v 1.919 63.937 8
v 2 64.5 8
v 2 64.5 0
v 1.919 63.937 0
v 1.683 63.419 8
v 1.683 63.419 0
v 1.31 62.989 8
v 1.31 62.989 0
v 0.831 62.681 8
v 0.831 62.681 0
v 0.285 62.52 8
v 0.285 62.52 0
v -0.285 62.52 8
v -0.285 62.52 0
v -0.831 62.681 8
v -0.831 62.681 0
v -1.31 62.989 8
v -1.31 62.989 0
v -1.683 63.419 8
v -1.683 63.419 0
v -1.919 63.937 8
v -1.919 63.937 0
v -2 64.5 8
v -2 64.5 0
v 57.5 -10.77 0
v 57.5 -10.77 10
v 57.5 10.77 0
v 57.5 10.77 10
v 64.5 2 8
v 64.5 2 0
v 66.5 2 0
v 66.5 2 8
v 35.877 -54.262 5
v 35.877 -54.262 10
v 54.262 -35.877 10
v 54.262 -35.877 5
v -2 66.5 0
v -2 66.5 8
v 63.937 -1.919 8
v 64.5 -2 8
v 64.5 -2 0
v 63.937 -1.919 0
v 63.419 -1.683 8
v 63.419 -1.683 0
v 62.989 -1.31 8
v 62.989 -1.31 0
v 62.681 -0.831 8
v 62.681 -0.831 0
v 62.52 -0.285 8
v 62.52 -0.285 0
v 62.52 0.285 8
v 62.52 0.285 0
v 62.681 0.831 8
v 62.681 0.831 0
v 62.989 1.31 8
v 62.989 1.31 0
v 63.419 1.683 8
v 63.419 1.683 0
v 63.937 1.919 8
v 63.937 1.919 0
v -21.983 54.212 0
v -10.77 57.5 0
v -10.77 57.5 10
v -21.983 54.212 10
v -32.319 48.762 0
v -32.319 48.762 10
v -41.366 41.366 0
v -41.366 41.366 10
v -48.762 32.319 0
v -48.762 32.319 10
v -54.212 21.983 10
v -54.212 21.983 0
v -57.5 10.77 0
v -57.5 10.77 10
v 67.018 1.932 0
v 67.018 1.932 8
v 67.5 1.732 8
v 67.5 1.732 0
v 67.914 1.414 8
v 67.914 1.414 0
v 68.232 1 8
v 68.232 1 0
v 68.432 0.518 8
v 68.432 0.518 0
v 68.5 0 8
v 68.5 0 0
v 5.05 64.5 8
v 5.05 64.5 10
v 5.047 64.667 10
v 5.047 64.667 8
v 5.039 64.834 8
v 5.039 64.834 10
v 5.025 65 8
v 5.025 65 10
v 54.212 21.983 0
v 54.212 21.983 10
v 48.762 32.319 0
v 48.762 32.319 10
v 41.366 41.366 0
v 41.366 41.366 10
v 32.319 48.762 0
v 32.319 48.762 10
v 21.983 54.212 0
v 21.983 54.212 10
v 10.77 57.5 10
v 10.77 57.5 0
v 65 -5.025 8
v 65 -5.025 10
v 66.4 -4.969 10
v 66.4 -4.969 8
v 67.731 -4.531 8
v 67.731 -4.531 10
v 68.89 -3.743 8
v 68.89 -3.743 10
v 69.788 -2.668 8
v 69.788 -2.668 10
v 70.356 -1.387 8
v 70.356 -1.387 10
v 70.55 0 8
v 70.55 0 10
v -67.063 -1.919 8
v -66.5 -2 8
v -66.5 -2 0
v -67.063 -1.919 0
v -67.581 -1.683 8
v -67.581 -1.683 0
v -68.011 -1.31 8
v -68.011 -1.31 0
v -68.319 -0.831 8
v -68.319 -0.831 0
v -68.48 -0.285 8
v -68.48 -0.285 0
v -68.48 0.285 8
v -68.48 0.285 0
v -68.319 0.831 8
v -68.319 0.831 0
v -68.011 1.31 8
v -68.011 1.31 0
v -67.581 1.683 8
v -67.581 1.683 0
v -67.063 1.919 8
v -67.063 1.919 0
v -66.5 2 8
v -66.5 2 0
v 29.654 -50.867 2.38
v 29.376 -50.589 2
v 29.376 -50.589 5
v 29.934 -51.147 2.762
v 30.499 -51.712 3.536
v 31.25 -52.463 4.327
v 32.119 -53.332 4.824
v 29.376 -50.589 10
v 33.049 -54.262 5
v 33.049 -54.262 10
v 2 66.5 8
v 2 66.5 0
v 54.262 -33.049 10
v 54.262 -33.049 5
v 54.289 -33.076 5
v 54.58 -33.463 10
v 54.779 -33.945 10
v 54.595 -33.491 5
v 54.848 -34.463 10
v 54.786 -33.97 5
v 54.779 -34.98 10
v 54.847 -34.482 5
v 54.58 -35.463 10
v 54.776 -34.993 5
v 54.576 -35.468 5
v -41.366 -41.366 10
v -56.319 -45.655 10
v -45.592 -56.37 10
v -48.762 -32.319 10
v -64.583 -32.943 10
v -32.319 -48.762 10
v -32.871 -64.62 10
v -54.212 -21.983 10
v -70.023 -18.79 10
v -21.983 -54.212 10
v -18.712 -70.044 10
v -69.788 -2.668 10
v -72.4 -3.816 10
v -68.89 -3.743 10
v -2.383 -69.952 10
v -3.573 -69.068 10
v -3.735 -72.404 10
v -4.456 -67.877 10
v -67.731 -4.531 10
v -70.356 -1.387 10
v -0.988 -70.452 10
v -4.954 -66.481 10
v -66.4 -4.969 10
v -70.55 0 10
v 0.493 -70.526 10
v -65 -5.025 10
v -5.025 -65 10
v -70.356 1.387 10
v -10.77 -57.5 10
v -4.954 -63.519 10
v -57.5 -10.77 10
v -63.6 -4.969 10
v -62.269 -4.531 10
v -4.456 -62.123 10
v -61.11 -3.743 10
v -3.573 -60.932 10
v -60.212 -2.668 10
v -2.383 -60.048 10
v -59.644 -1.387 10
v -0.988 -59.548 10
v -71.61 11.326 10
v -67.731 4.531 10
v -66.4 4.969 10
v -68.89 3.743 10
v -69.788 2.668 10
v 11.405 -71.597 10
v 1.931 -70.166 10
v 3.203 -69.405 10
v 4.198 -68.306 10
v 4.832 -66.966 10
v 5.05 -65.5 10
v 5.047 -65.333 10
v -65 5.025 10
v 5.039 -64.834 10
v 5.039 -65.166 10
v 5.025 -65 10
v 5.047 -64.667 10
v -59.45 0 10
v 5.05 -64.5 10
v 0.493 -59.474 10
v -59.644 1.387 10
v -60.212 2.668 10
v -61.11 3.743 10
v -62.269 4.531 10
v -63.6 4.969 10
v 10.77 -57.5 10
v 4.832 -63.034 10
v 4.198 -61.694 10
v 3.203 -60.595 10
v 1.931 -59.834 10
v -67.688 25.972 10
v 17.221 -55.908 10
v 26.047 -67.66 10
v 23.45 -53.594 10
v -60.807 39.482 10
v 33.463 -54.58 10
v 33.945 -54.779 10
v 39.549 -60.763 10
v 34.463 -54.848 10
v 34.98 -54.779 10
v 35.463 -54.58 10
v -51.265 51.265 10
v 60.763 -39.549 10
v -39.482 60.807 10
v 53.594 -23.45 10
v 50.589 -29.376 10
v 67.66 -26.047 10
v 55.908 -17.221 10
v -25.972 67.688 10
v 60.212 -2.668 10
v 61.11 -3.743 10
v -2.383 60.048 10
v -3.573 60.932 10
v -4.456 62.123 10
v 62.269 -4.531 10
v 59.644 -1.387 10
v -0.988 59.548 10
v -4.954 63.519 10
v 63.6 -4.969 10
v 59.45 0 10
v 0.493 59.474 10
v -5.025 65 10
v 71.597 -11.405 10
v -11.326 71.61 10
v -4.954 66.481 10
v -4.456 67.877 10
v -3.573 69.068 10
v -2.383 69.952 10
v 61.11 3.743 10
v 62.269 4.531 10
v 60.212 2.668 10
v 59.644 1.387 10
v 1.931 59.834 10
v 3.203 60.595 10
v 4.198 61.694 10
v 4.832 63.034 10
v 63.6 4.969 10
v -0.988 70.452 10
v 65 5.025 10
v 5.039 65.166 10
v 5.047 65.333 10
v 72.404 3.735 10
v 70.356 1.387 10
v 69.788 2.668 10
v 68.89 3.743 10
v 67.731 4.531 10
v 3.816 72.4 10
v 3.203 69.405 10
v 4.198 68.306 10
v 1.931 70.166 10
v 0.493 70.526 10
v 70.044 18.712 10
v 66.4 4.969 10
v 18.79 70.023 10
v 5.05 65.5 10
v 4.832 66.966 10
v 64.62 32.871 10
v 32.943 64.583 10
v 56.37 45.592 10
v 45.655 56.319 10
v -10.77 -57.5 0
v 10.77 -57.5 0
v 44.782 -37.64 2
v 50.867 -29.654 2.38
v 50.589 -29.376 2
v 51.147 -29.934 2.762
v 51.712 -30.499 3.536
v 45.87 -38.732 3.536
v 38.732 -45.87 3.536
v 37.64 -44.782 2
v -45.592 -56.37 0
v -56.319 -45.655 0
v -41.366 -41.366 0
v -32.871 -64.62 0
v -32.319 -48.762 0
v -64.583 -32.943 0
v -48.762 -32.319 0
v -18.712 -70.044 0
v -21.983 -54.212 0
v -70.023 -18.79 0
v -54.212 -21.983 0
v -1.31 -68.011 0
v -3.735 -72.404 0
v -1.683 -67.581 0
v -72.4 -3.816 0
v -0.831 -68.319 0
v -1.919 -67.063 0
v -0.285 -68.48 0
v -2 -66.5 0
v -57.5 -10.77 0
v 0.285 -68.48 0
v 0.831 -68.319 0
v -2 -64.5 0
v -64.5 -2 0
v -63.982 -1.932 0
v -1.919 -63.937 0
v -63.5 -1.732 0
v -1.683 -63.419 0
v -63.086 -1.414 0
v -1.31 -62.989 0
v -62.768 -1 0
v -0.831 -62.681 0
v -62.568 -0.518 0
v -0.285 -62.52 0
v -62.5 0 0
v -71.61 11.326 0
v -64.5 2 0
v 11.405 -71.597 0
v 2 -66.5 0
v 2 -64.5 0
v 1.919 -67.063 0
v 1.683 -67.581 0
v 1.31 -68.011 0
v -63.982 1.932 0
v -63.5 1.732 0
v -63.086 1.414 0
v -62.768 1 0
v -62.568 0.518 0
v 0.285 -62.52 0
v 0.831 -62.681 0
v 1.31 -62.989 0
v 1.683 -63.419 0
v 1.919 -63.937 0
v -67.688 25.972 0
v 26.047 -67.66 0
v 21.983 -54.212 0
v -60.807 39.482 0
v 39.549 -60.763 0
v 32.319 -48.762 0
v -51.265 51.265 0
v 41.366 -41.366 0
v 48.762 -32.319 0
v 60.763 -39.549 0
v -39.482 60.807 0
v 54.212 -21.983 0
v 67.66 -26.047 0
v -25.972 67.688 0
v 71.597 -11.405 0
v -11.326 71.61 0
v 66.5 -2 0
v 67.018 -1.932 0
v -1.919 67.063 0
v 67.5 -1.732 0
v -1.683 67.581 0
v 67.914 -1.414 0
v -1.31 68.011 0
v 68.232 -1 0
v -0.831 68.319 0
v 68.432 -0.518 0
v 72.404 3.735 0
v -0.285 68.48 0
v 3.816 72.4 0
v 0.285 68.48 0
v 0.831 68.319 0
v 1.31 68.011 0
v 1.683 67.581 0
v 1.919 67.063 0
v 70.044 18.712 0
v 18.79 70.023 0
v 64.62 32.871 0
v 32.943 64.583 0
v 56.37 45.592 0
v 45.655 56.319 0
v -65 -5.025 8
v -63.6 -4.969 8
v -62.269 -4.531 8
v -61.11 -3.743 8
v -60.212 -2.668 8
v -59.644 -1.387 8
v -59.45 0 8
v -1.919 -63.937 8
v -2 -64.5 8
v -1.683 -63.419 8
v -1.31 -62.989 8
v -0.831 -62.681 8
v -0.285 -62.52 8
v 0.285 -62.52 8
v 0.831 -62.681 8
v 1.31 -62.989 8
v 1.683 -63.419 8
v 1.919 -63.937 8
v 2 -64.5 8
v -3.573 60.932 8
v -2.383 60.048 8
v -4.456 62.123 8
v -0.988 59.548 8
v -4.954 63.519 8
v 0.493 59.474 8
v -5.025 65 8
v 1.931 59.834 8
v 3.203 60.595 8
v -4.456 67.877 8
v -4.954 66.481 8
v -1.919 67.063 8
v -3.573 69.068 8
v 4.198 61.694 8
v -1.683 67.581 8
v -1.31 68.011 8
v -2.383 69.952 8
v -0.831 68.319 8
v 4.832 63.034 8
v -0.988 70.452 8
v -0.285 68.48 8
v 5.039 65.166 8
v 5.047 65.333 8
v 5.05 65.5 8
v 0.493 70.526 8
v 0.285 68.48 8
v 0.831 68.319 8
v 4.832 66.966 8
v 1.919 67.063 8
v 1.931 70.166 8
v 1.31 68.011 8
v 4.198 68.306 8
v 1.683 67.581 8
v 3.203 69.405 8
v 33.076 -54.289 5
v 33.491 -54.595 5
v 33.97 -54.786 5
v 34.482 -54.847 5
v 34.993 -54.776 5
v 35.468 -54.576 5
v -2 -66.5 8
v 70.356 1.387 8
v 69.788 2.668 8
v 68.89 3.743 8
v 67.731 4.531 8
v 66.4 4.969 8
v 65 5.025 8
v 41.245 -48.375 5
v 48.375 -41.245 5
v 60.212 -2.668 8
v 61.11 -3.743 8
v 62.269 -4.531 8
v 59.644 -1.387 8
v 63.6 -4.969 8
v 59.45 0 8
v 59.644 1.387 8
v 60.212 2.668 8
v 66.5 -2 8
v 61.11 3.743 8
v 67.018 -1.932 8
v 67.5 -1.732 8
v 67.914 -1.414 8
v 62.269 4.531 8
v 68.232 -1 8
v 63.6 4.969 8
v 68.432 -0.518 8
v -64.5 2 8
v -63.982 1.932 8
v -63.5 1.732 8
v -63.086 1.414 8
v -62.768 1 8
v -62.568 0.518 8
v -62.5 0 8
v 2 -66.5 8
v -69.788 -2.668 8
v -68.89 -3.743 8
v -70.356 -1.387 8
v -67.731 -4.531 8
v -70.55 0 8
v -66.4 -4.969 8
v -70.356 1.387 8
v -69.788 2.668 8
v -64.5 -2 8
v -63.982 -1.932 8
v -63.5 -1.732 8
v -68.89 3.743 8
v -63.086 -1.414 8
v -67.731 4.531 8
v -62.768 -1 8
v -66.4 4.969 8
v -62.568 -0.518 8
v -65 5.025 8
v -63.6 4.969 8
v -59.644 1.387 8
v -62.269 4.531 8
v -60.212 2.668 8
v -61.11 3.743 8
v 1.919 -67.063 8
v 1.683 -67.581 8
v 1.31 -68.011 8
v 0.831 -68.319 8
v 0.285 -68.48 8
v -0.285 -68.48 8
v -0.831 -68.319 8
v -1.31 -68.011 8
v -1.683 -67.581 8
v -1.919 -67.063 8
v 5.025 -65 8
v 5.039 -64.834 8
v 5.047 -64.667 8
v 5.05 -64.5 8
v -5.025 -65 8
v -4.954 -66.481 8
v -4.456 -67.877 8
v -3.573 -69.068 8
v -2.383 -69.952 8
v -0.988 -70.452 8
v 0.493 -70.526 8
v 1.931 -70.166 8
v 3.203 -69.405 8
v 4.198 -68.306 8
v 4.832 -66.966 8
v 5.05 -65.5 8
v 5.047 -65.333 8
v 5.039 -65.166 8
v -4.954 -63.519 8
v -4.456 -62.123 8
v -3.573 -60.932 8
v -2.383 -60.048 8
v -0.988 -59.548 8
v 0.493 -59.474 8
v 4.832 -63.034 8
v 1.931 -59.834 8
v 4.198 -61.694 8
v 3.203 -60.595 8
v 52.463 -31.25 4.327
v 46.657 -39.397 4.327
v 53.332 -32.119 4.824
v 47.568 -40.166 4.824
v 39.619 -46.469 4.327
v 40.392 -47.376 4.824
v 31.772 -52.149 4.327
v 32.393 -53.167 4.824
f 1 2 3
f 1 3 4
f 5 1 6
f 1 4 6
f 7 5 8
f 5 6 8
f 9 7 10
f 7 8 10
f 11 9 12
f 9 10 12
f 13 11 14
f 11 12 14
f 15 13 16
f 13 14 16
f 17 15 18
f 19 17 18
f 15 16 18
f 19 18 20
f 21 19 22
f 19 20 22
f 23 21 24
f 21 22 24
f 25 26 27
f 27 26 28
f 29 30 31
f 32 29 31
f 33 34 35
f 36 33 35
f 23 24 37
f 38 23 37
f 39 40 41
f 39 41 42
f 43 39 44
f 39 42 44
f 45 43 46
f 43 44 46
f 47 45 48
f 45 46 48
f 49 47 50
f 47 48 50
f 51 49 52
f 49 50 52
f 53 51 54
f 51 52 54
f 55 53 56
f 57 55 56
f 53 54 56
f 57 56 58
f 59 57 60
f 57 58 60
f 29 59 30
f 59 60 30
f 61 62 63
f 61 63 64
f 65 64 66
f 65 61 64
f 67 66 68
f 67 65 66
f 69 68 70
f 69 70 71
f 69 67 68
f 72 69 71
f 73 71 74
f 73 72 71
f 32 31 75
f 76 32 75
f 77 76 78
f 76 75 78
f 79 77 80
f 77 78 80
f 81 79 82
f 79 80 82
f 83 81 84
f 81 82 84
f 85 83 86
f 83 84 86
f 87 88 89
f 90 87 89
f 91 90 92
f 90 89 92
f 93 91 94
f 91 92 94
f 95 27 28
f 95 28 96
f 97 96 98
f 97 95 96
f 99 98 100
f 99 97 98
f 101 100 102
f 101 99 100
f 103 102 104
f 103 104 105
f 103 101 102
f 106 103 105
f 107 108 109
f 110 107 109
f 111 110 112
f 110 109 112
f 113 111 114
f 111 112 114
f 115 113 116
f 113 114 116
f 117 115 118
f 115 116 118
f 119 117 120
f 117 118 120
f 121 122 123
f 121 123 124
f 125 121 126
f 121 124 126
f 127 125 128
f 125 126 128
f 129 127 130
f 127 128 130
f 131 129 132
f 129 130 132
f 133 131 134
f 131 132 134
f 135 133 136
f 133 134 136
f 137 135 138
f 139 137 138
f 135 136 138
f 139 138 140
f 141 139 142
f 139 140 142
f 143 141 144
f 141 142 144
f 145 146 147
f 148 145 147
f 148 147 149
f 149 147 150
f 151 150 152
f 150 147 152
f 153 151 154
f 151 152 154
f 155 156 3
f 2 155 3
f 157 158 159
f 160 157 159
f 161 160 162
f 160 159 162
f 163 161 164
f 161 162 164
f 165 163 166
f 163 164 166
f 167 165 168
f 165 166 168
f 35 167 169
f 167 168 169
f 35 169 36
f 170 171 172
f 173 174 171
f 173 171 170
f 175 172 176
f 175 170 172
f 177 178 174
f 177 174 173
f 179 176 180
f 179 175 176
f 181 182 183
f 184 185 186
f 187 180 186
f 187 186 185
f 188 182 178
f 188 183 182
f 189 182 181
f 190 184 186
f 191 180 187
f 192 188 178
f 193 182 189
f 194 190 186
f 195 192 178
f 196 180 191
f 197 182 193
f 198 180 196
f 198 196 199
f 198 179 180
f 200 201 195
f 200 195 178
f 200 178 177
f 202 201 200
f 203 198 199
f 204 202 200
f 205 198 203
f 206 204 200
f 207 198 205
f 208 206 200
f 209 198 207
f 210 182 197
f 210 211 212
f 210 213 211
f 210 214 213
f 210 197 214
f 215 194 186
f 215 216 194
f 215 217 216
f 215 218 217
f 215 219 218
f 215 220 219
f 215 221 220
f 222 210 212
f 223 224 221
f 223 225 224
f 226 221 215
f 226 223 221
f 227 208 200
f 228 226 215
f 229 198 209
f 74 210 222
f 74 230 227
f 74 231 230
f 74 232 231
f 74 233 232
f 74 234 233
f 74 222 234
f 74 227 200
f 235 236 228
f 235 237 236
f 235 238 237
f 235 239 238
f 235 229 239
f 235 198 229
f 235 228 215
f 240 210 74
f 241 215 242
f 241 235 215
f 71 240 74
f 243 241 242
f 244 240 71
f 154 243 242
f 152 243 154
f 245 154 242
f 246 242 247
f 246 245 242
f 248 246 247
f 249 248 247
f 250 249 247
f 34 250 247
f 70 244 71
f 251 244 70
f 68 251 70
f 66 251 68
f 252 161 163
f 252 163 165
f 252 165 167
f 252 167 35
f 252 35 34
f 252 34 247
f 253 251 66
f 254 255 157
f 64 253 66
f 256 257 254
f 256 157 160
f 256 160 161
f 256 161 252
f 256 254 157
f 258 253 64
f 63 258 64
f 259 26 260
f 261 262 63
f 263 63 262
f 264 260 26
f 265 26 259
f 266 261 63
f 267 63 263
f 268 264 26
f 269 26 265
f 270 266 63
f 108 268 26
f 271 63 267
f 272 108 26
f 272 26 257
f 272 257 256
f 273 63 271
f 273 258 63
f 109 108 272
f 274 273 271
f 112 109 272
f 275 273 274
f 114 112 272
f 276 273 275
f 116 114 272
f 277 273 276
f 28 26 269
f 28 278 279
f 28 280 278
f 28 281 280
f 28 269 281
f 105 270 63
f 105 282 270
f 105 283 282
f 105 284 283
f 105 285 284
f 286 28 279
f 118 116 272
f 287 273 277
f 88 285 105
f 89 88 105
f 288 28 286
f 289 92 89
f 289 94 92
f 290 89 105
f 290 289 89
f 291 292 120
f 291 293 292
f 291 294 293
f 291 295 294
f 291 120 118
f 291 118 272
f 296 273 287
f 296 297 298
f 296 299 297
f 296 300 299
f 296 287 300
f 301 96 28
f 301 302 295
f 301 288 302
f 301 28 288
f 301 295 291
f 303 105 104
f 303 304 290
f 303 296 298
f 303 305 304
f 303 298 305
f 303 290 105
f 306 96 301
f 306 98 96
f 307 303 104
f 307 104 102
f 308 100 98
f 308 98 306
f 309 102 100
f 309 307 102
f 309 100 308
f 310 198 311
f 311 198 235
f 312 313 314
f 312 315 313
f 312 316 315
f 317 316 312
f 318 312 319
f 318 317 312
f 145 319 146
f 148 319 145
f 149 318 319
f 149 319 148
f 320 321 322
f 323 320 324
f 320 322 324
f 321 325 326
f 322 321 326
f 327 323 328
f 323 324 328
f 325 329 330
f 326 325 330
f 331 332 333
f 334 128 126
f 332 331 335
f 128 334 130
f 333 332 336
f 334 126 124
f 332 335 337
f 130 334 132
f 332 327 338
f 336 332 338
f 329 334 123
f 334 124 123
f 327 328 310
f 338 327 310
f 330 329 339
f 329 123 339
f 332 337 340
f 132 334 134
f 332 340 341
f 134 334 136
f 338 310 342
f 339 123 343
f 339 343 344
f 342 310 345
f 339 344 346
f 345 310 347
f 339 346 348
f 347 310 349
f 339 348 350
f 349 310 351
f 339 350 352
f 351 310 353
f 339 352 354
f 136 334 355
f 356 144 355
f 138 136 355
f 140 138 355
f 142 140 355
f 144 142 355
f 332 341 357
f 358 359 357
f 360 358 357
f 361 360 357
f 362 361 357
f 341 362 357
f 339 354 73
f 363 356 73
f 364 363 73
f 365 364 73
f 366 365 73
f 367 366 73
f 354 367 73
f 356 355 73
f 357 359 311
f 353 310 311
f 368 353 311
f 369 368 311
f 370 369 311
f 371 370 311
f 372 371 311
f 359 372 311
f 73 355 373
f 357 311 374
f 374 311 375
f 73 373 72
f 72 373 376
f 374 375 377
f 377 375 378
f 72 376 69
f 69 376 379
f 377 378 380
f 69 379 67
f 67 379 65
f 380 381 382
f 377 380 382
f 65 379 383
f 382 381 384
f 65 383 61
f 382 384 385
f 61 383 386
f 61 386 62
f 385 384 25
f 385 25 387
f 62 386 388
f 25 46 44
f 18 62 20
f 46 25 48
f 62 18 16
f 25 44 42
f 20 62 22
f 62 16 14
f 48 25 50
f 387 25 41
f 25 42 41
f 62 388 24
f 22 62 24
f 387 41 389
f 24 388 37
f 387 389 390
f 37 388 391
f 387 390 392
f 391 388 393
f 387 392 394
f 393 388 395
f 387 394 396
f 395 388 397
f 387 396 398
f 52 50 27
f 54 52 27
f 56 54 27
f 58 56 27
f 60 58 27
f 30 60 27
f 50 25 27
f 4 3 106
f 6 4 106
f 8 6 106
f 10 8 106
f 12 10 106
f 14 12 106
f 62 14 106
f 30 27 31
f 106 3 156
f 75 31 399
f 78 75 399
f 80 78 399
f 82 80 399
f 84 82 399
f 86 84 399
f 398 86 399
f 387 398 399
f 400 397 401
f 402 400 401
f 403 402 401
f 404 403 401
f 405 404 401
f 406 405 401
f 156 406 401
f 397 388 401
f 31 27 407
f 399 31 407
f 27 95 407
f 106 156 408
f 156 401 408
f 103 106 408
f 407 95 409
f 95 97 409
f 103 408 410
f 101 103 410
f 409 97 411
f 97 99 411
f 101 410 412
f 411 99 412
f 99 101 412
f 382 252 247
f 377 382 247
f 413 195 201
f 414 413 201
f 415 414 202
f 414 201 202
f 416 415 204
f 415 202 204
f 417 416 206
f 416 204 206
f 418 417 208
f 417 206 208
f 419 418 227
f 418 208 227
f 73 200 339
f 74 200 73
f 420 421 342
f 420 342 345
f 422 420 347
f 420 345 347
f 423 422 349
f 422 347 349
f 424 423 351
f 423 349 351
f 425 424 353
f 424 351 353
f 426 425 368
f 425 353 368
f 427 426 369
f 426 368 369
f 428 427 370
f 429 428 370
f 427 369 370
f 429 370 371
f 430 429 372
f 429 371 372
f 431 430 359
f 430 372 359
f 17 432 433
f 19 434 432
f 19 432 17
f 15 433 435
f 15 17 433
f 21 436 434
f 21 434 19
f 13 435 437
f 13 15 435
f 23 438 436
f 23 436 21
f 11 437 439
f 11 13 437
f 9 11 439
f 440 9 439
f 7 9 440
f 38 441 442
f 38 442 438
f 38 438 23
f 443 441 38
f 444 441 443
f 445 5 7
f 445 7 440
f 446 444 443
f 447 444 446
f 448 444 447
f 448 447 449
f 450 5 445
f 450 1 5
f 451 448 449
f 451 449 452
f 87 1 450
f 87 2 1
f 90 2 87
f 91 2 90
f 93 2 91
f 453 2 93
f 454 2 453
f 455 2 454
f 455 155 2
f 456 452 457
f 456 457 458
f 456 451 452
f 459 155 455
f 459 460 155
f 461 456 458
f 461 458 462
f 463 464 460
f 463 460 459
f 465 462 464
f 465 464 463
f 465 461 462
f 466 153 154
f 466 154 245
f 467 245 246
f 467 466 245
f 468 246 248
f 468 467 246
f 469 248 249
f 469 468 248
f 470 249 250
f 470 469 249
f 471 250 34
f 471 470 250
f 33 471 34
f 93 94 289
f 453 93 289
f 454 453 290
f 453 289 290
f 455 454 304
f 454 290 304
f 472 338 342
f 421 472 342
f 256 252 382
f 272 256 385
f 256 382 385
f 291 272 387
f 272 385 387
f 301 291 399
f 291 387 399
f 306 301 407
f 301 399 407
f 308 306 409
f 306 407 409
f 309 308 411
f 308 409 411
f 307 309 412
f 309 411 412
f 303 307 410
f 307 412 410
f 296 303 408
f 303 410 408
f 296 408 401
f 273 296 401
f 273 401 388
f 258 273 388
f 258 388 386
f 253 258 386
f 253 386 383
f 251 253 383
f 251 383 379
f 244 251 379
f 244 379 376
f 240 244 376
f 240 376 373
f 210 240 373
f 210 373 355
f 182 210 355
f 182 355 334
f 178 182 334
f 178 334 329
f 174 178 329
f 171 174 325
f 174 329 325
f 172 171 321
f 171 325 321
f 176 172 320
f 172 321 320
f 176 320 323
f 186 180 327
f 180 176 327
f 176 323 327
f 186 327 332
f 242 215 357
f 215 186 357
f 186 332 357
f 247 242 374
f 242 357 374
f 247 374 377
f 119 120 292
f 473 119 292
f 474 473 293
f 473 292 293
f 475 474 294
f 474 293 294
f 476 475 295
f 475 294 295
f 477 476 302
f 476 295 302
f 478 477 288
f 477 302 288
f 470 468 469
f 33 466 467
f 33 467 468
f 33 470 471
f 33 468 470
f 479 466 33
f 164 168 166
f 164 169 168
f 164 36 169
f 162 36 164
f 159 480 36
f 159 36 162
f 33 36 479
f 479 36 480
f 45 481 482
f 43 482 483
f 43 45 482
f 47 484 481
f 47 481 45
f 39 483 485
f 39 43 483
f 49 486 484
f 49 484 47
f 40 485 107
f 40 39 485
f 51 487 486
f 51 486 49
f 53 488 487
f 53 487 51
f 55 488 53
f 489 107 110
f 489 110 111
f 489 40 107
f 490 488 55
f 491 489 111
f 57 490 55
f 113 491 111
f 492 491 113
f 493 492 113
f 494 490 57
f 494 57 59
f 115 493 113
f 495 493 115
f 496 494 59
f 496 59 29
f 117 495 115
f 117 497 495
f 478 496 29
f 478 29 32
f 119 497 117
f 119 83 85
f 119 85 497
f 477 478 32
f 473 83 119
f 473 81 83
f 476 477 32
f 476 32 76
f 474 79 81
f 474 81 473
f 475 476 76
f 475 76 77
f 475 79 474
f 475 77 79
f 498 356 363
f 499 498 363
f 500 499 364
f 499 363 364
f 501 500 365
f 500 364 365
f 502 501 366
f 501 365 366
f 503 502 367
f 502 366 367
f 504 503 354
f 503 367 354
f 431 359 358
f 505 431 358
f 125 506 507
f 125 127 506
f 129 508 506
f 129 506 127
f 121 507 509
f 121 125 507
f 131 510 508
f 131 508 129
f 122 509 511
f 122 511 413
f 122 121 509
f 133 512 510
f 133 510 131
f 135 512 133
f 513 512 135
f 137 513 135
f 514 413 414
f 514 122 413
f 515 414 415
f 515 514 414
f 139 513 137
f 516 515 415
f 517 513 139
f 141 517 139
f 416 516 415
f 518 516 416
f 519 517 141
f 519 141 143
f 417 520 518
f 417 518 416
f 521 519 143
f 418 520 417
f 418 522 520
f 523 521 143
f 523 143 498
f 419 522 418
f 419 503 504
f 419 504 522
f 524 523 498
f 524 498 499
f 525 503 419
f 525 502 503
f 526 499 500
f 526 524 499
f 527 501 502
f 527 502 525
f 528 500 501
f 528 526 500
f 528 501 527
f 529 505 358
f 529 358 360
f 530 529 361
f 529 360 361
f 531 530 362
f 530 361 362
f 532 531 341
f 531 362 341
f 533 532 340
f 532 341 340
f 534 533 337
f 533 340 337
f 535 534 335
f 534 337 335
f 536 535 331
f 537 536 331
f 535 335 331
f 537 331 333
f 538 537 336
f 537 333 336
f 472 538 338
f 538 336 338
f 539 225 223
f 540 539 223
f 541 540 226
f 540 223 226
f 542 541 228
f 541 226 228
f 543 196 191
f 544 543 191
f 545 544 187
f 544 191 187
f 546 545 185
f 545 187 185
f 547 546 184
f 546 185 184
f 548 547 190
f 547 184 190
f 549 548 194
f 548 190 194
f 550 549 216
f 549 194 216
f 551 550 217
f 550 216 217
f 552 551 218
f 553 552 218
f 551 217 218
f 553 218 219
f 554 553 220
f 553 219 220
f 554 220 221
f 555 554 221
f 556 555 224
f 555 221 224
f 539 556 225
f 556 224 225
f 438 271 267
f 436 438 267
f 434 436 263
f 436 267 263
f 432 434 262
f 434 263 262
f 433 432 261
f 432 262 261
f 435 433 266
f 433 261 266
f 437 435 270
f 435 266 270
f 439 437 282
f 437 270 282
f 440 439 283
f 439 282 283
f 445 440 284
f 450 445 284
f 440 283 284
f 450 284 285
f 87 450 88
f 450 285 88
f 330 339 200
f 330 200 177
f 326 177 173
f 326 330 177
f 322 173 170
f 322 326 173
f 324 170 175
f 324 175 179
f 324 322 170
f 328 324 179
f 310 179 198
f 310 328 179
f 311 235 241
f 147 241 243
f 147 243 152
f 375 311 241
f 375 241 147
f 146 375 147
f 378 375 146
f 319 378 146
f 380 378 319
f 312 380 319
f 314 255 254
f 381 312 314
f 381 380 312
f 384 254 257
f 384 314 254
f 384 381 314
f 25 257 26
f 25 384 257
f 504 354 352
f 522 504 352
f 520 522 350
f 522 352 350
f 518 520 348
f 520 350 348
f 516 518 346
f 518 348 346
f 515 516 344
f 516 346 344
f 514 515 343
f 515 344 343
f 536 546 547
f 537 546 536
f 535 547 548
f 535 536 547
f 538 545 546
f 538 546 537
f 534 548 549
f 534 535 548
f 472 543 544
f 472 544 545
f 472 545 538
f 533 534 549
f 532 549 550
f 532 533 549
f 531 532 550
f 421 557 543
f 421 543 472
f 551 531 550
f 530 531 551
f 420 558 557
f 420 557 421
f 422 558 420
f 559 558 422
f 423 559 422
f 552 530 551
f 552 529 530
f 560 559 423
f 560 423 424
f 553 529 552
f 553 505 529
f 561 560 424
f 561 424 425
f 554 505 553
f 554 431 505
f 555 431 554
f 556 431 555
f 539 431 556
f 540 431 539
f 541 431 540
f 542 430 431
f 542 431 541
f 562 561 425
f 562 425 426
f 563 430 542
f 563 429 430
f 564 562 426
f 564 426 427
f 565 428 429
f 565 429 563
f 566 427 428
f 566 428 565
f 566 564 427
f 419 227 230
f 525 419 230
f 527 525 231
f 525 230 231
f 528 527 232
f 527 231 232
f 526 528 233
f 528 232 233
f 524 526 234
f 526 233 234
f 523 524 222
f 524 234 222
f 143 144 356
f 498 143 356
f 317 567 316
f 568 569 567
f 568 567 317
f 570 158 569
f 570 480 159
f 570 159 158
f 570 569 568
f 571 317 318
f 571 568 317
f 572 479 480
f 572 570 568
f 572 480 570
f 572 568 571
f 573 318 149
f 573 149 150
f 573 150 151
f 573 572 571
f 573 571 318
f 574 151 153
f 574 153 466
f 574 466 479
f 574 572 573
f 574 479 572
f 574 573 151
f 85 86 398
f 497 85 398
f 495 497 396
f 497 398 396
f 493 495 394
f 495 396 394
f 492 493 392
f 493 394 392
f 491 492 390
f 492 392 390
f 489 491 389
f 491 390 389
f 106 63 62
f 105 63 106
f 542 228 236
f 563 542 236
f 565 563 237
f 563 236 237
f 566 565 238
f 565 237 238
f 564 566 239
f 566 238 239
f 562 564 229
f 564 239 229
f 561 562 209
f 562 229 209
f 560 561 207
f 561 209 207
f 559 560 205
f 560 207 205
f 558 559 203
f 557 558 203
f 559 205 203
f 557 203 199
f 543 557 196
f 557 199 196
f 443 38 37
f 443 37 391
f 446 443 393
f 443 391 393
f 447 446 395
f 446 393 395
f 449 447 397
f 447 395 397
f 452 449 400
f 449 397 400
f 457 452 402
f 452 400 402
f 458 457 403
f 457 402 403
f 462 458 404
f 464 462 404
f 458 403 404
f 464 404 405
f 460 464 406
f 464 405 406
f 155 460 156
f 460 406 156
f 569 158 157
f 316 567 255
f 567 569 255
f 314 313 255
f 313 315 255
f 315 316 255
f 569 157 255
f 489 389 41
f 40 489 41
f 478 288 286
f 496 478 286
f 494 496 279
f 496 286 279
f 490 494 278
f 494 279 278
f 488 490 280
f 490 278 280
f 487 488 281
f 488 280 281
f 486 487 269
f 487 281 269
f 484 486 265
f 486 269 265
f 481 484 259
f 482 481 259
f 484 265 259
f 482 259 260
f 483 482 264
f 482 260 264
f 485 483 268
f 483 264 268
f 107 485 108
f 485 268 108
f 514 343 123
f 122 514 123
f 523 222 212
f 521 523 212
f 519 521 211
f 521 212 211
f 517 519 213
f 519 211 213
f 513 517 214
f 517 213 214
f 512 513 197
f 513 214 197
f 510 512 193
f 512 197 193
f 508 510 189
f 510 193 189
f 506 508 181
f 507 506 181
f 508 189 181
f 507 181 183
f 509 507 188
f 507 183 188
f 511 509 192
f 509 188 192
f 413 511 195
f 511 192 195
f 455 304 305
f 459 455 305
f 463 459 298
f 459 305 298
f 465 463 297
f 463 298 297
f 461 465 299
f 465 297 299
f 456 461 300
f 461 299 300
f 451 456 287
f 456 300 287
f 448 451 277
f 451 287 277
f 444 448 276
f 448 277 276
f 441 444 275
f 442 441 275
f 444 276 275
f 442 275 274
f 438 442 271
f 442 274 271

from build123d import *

# Parameters (mm, degrees)
F0_R      = 72.5
F0_R_2    = 58.5
F1_DEPTH  = 10
F3_DEPTH  = 10.001
F5_DEPTH  = 5
F7_DEPTH  = 2
F8_SIZE   = 3
F9_R      = 5
F10_R     = 2
F11_W     = 21.5406592285
F11_H     = 1
F11_W_2   = 1
F11_H_2   = 21.5406592285
F12_DEPTH = 10


with BuildPart() as f1:
    # F0 (on Top) → F1 (new body)
    with BuildSketch(Plane.XY):
        Circle(F0_R)
        with BuildLine():
            ThreePointArc((2, -66.5), (0, -68.5), (-2, -66.5))
            Line((-2, -66.5), (-2, -64.5))
            ThreePointArc((-2, -64.5), (0, -62.5), (2, -64.5))
            Line((2, -64.5), (2, -66.5))
        make_face(mode=Mode.SUBTRACT)
        with BuildLine():
            Line((-65.5, 2), (-64.5, 2))
            ThreePointArc((-64.5, 2), (-63.0857864376, 1.4142135624), (-62.5, 0))
            ThreePointArc((-62.5, 0), (-63.0857864376, -1.4142135624), (-64.5, -2))
            Line((-64.5, -2), (-65.5, -2))
            Line((-65.5, -2), (-66.5, -2))
            ThreePointArc((-66.5, -2), (-68.5, 0), (-66.5, 2))
            Line((-66.5, 2), (-65.5, 2))
        make_face(mode=Mode.SUBTRACT)
        Circle(F0_R_2, mode=Mode.SUBTRACT)
        with BuildLine():
            ThreePointArc((66.5, 2), (67.9142135624, 1.4142135624), (68.5, 0))
            ThreePointArc((68.5, 0), (67.9142135624, -1.4142135624), (66.5, -2))
            Line((66.5, -2), (64.5, -2))
            ThreePointArc((64.5, -2), (62.5, 0), (64.5, 2))
            Line((64.5, 2), (66.5, 2))
        make_face(mode=Mode.SUBTRACT)
        with BuildLine():
            ThreePointArc((-2, 66.5), (0, 68.5), (2, 66.5))
            Line((2, 66.5), (2, 64.5))
            ThreePointArc((2, 64.5), (0, 62.5), (-2, 64.5))
            Line((-2, 64.5), (-2, 66.5))
        make_face(mode=Mode.SUBTRACT)
    extrude(amount=F1_DEPTH)

    # F2 (on face) → F3 (cut, through all)
    with BuildSketch(Plane.XY.offset(10)):
        Polygon((39.5494049015, -60.7626083371), (40.6586399182, -61.8718433538), (61.8718433538, -40.6586399182), (60.7626083371, -39.5494049015), align=None)
        with BuildLine():
            ThreePointArc((39.5494049015, -60.7626083371), (45.6549558742, -56.319401667), (51.2652415538, -51.2652417182))
            ThreePointArc((51.2652415538, -51.2652417182), (56.3194015937, -45.6549559645), (60.7626083371, -39.5494049015))
            Line((60.7626083371, -39.5494049015), (39.5494049015, -60.7626083371))
        make_face()
    extrude(amount=-F3_DEPTH, mode=Mode.SUBTRACT)

    # F4 (on face) → F5 (cut)
    with BuildSketch(Plane.XY.offset(10)):
        Polygon((55.6760094304, -34.4628059948), (50.5894105236, -29.376207088), (29.376207088, -50.5894105236), (34.4628059948, -55.6760094304), align=None)
    extrude(amount=-F5_DEPTH, mode=Mode.SUBTRACT)

    # F6 (on face) → F7 (cut)
    with BuildSketch(Plane.XY.offset(10)):
        with BuildLine():
            ThreePointArc((-65, -5.0251865637), (-61.7565056431, -3.3895058637), (-60.45, 0))
            ThreePointArc((-60.45, 0), (-61.7565056431, 3.3895058637), (-65, 5.0251865637))
            ThreePointArc((-65, 5.0251865637), (-69.55, 0), (-65, -5.0251865637))
        make_face()
        with BuildLine():
            ThreePointArc((-65, 5.0251865637), (-61.7565056431, 3.3895058637), (-60.45, 0))
            ThreePointArc((-60.45, 0), (-61.7565056431, -3.3895058637), (-65, -5.0251865637))
            ThreePointArc((-65, -5.0251865637), (-61.1104941363, -3.7434943569), (-59.45, 0))
            ThreePointArc((-59.45, 0), (-61.1104941363, 3.7434943569), (-65, 5.0251865637))
        make_face()
        with BuildLine():
            ThreePointArc((-65, -5.0251865637), (-69.55, 0), (-65, 5.0251865637))
            ThreePointArc((-65, 5.0251865637), (-70.55, 0), (-65, -5.0251865637))
        make_face()
        with BuildLine():
            ThreePointArc((5.0251865637, 65), (5.0437928262, 65.249692336), (5.05, 65.5))
            ThreePointArc((5.05, 65.5), (-0.250307664, 70.5437928262), (-5.0251865637, 65))
            ThreePointArc((-5.0251865637, 65), (0, 69.55), (5.0251865637, 65))
        make_face()
        with BuildLine():
            ThreePointArc((5.0251865637, 65), (0, 69.55), (-5.0251865637, 65))
            ThreePointArc((-5.0251865637, 65), (0, 60.45), (5.0251865637, 65))
        make_face()
        with BuildLine():
            ThreePointArc((5.0251865637, 65), (0, 60.45), (-5.0251865637, 65))
            ThreePointArc((-5.0251865637, 65), (-0.250307664, 59.4562071738), (5.05, 64.5))
            ThreePointArc((5.05, 64.5), (5.0437928262, 64.750307664), (5.0251865637, 65))
        make_face()
        with BuildLine():
            ThreePointArc((65, -5.0251865637), (68.8895058637, -3.7434943569), (70.55, 0))
            ThreePointArc((70.55, 0), (68.8895058637, 3.7434943569), (65, 5.0251865637))
            ThreePointArc((65, 5.0251865637), (68.2434943569, 3.3895058637), (69.55, 0))
            ThreePointArc((69.55, 0), (68.2434943569, -3.3895058637), (65, -5.0251865637))
        make_face()
        with BuildLine():
            ThreePointArc((69.55, 0), (68.2434943569, 3.3895058637), (65, 5.0251865637))
            ThreePointArc((65, 5.0251865637), (60.45, 0), (65, -5.0251865637))
            ThreePointArc((65, -5.0251865637), (68.2434943569, -3.3895058637), (69.55, 0))
        make_face()
        with BuildLine():
            ThreePointArc((65, -5.0251865637), (60.45, 0), (65, 5.0251865637))
            ThreePointArc((65, 5.0251865637), (59.45, 0), (65, -5.0251865637))
        make_face()
        with BuildLine():
            ThreePointArc((-5.0251865637, -65), (-0.250307664, -70.5437928262), (5.05, -65.5))
            ThreePointArc((5.05, -65.5), (5.0437928262, -65.249692336), (5.0251865637, -65))
            ThreePointArc((5.0251865637, -65), (0, -69.55), (-5.0251865637, -65))
        make_face()
        with BuildLine():
            ThreePointArc((-5.0251865637, -65), (0, -69.55), (5.0251865637, -65))
            ThreePointArc((5.0251865637, -65), (0, -60.45), (-5.0251865637, -65))
        make_face()
        with BuildLine():
            ThreePointArc((-5.0251865637, -65), (0, -60.45), (5.0251865637, -65))
            ThreePointArc((5.0251865637, -65), (5.0437928262, -64.750307664), (5.05, -64.5))
            ThreePointArc((5.05, -64.5), (-0.250307664, -59.4562071738), (-5.0251865637, -65))
        make_face()
    extrude(amount=-F7_DEPTH, mode=Mode.SUBTRACT)

    # F8
    f8_edges = [f1.edges().sort_by_distance(p)[0] for p in [
        (41.365747, -41.365747, 5),
    ]]
    chamfer(f8_edges, length=F8_SIZE)

    # F9
    f9_edges = [f1.edges().sort_by_distance(p)[0] for p in [
        (43.487067, -43.487067, 5),
    ]]
    fillet(f9_edges, radius=F9_R)

    # F10
    f10_edges = [f1.edges().sort_by_distance(p)[0] for p in [
        (55.676009, -34.462806, 7.5),
        (34.462806, -55.676009, 7.5),
    ]]
    fillet(f10_edges, radius=F10_R)

    # F11 (on face) → F12 (join)
    with BuildSketch(Plane.XY.offset(10)):
        with Locations((0, -58)):
            Rectangle(F11_W, F11_H)
        with Locations((58, 0)):
            Rectangle(F11_W_2, F11_H_2)
        with Locations((0, 58)):
            Rectangle(F11_W, F11_H)
        with Locations((-58, 0)):
            Rectangle(F11_W_2, F11_H_2)
    extrude(amount=-F12_DEPTH)


solid = f1.part
